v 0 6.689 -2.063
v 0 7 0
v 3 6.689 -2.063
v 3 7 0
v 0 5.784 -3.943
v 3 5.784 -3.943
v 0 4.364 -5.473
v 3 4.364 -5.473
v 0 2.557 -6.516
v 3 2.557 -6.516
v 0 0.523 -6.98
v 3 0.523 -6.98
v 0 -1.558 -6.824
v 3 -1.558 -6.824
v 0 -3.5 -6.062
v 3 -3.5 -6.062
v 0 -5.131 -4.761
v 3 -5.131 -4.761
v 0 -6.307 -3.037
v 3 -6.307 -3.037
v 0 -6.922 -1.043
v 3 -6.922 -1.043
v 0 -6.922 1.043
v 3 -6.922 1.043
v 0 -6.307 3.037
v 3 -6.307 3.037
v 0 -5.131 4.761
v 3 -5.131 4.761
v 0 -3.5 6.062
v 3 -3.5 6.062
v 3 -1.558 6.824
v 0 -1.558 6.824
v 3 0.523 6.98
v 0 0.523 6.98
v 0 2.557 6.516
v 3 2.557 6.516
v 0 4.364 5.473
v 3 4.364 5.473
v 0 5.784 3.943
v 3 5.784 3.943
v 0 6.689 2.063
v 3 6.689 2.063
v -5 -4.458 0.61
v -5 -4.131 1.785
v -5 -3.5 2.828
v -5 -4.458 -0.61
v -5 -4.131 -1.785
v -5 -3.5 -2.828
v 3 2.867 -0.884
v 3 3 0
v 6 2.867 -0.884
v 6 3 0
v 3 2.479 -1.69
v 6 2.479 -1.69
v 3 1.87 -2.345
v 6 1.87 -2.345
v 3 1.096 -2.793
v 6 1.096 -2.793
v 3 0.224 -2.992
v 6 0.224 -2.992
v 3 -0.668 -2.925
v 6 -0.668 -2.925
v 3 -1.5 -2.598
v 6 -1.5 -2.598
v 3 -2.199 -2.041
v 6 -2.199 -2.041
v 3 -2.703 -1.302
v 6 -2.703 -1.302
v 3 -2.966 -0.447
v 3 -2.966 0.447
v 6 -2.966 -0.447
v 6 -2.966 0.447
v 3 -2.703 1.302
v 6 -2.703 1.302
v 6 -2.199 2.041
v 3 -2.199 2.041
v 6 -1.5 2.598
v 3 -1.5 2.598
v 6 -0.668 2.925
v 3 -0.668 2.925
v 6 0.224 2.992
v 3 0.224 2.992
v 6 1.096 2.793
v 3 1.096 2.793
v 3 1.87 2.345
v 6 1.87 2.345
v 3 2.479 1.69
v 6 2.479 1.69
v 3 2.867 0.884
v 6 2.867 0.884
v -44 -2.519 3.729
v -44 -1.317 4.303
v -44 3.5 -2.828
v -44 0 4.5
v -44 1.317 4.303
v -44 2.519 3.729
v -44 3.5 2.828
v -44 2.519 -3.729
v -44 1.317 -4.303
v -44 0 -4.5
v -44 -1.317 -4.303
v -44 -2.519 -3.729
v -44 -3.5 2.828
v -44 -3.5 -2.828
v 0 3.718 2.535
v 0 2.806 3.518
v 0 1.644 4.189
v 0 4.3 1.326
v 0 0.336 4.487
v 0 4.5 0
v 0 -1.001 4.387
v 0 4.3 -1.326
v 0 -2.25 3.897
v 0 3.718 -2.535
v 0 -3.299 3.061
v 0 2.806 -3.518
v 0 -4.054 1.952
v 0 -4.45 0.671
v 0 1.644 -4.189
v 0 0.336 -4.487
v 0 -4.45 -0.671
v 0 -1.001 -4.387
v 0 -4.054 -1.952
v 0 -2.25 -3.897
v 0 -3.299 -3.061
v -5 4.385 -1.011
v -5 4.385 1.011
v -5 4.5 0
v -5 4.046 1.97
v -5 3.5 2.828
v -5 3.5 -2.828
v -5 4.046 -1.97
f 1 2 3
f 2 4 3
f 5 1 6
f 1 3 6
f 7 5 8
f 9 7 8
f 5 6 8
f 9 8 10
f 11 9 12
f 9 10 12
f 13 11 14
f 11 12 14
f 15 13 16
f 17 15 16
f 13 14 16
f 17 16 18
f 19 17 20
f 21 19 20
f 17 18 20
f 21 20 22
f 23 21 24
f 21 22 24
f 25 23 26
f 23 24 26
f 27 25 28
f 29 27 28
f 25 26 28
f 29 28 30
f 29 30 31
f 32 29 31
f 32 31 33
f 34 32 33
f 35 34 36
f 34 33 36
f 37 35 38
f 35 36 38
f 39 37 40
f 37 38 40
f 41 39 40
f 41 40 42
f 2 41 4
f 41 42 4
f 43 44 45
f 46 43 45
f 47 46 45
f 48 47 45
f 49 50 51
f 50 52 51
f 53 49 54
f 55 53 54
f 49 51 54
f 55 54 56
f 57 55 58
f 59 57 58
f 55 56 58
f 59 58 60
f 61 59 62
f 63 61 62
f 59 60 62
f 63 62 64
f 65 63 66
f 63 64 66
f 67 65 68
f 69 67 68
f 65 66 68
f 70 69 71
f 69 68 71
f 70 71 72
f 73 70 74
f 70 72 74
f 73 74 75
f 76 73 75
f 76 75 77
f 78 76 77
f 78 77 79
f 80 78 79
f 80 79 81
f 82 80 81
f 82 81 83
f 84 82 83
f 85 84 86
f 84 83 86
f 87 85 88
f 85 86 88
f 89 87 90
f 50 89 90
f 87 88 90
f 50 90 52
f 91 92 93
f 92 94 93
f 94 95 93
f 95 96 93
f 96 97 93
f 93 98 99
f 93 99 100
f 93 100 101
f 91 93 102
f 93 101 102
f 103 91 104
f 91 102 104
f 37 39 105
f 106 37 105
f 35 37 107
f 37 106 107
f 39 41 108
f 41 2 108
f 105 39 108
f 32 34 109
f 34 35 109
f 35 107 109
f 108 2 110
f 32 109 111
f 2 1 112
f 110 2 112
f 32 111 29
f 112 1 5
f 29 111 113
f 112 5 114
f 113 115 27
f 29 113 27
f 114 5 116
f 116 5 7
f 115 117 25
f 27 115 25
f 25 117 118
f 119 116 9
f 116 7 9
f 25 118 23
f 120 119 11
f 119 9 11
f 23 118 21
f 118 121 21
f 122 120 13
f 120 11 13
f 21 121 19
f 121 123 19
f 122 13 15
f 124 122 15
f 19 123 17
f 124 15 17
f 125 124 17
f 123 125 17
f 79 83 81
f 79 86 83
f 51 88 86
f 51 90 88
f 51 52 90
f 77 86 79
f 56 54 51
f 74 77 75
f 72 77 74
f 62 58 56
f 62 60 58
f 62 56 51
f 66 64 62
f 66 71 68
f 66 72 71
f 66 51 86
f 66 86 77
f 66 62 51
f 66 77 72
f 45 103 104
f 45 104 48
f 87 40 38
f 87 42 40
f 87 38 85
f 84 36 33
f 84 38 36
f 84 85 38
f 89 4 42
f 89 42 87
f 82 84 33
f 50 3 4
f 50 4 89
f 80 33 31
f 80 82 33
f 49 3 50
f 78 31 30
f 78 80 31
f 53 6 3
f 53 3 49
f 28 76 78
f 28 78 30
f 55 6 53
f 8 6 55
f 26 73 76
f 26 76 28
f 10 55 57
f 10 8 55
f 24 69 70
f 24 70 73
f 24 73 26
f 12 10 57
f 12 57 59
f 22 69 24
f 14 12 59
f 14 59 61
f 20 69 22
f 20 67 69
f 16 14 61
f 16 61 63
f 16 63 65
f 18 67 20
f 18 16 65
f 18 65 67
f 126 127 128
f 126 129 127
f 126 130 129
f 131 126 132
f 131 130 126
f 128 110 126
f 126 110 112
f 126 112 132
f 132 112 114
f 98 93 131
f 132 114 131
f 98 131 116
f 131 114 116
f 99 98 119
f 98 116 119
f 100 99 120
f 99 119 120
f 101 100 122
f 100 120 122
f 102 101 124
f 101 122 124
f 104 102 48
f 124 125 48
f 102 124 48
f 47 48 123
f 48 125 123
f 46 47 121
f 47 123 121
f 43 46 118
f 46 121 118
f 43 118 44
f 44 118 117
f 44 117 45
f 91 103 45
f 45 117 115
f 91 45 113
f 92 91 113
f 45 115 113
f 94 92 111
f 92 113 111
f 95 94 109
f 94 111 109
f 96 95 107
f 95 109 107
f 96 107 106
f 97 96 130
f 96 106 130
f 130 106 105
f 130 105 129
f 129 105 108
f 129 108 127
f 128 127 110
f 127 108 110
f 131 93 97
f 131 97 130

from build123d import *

# Parameters (mm, degrees)
SKETCH_1_W          = 44
SKETCH_1_H          = 4.5
SKETCH_1_W_2        = 3
SKETCH_1_H_2        = 7
SKETCH_1_H_3        = 3
SKETCH_5_W          = 39
SKETCH_5_H          = 1
CUT_EXTRUDE_2_DEPTH = 5


with BuildPart() as part:
    # 草圖1 → 旋轉1 (revolve)
    with BuildSketch(Plane.XY):
        with Locations((-22, 2.25)):
            Rectangle(SKETCH_1_W, SKETCH_1_H)
        with Locations((1.5, 3.5)):
            Rectangle(SKETCH_1_W_2, SKETCH_1_H_2)
        with Locations((4.5, 1.5)):
            Rectangle(SKETCH_1_W_2, SKETCH_1_H_3)
    revolve(axis=Axis((0, 0, 0), (-1, 0, 0)))

    # 草圖5 → 除料-伸長2 (cut, symmetric)
    with BuildSketch(Plane.XY):
        with Locations((-24.5, 4)):
            Rectangle(SKETCH_5_W, SKETCH_5_H)
        with Locations((-24.5, -4)):
            Rectangle(SKETCH_5_W, SKETCH_5_H)
    extrude(amount=CUT_EXTRUDE_2_DEPTH, both=True, mode=Mode.SUBTRACT)


solid = part.part
